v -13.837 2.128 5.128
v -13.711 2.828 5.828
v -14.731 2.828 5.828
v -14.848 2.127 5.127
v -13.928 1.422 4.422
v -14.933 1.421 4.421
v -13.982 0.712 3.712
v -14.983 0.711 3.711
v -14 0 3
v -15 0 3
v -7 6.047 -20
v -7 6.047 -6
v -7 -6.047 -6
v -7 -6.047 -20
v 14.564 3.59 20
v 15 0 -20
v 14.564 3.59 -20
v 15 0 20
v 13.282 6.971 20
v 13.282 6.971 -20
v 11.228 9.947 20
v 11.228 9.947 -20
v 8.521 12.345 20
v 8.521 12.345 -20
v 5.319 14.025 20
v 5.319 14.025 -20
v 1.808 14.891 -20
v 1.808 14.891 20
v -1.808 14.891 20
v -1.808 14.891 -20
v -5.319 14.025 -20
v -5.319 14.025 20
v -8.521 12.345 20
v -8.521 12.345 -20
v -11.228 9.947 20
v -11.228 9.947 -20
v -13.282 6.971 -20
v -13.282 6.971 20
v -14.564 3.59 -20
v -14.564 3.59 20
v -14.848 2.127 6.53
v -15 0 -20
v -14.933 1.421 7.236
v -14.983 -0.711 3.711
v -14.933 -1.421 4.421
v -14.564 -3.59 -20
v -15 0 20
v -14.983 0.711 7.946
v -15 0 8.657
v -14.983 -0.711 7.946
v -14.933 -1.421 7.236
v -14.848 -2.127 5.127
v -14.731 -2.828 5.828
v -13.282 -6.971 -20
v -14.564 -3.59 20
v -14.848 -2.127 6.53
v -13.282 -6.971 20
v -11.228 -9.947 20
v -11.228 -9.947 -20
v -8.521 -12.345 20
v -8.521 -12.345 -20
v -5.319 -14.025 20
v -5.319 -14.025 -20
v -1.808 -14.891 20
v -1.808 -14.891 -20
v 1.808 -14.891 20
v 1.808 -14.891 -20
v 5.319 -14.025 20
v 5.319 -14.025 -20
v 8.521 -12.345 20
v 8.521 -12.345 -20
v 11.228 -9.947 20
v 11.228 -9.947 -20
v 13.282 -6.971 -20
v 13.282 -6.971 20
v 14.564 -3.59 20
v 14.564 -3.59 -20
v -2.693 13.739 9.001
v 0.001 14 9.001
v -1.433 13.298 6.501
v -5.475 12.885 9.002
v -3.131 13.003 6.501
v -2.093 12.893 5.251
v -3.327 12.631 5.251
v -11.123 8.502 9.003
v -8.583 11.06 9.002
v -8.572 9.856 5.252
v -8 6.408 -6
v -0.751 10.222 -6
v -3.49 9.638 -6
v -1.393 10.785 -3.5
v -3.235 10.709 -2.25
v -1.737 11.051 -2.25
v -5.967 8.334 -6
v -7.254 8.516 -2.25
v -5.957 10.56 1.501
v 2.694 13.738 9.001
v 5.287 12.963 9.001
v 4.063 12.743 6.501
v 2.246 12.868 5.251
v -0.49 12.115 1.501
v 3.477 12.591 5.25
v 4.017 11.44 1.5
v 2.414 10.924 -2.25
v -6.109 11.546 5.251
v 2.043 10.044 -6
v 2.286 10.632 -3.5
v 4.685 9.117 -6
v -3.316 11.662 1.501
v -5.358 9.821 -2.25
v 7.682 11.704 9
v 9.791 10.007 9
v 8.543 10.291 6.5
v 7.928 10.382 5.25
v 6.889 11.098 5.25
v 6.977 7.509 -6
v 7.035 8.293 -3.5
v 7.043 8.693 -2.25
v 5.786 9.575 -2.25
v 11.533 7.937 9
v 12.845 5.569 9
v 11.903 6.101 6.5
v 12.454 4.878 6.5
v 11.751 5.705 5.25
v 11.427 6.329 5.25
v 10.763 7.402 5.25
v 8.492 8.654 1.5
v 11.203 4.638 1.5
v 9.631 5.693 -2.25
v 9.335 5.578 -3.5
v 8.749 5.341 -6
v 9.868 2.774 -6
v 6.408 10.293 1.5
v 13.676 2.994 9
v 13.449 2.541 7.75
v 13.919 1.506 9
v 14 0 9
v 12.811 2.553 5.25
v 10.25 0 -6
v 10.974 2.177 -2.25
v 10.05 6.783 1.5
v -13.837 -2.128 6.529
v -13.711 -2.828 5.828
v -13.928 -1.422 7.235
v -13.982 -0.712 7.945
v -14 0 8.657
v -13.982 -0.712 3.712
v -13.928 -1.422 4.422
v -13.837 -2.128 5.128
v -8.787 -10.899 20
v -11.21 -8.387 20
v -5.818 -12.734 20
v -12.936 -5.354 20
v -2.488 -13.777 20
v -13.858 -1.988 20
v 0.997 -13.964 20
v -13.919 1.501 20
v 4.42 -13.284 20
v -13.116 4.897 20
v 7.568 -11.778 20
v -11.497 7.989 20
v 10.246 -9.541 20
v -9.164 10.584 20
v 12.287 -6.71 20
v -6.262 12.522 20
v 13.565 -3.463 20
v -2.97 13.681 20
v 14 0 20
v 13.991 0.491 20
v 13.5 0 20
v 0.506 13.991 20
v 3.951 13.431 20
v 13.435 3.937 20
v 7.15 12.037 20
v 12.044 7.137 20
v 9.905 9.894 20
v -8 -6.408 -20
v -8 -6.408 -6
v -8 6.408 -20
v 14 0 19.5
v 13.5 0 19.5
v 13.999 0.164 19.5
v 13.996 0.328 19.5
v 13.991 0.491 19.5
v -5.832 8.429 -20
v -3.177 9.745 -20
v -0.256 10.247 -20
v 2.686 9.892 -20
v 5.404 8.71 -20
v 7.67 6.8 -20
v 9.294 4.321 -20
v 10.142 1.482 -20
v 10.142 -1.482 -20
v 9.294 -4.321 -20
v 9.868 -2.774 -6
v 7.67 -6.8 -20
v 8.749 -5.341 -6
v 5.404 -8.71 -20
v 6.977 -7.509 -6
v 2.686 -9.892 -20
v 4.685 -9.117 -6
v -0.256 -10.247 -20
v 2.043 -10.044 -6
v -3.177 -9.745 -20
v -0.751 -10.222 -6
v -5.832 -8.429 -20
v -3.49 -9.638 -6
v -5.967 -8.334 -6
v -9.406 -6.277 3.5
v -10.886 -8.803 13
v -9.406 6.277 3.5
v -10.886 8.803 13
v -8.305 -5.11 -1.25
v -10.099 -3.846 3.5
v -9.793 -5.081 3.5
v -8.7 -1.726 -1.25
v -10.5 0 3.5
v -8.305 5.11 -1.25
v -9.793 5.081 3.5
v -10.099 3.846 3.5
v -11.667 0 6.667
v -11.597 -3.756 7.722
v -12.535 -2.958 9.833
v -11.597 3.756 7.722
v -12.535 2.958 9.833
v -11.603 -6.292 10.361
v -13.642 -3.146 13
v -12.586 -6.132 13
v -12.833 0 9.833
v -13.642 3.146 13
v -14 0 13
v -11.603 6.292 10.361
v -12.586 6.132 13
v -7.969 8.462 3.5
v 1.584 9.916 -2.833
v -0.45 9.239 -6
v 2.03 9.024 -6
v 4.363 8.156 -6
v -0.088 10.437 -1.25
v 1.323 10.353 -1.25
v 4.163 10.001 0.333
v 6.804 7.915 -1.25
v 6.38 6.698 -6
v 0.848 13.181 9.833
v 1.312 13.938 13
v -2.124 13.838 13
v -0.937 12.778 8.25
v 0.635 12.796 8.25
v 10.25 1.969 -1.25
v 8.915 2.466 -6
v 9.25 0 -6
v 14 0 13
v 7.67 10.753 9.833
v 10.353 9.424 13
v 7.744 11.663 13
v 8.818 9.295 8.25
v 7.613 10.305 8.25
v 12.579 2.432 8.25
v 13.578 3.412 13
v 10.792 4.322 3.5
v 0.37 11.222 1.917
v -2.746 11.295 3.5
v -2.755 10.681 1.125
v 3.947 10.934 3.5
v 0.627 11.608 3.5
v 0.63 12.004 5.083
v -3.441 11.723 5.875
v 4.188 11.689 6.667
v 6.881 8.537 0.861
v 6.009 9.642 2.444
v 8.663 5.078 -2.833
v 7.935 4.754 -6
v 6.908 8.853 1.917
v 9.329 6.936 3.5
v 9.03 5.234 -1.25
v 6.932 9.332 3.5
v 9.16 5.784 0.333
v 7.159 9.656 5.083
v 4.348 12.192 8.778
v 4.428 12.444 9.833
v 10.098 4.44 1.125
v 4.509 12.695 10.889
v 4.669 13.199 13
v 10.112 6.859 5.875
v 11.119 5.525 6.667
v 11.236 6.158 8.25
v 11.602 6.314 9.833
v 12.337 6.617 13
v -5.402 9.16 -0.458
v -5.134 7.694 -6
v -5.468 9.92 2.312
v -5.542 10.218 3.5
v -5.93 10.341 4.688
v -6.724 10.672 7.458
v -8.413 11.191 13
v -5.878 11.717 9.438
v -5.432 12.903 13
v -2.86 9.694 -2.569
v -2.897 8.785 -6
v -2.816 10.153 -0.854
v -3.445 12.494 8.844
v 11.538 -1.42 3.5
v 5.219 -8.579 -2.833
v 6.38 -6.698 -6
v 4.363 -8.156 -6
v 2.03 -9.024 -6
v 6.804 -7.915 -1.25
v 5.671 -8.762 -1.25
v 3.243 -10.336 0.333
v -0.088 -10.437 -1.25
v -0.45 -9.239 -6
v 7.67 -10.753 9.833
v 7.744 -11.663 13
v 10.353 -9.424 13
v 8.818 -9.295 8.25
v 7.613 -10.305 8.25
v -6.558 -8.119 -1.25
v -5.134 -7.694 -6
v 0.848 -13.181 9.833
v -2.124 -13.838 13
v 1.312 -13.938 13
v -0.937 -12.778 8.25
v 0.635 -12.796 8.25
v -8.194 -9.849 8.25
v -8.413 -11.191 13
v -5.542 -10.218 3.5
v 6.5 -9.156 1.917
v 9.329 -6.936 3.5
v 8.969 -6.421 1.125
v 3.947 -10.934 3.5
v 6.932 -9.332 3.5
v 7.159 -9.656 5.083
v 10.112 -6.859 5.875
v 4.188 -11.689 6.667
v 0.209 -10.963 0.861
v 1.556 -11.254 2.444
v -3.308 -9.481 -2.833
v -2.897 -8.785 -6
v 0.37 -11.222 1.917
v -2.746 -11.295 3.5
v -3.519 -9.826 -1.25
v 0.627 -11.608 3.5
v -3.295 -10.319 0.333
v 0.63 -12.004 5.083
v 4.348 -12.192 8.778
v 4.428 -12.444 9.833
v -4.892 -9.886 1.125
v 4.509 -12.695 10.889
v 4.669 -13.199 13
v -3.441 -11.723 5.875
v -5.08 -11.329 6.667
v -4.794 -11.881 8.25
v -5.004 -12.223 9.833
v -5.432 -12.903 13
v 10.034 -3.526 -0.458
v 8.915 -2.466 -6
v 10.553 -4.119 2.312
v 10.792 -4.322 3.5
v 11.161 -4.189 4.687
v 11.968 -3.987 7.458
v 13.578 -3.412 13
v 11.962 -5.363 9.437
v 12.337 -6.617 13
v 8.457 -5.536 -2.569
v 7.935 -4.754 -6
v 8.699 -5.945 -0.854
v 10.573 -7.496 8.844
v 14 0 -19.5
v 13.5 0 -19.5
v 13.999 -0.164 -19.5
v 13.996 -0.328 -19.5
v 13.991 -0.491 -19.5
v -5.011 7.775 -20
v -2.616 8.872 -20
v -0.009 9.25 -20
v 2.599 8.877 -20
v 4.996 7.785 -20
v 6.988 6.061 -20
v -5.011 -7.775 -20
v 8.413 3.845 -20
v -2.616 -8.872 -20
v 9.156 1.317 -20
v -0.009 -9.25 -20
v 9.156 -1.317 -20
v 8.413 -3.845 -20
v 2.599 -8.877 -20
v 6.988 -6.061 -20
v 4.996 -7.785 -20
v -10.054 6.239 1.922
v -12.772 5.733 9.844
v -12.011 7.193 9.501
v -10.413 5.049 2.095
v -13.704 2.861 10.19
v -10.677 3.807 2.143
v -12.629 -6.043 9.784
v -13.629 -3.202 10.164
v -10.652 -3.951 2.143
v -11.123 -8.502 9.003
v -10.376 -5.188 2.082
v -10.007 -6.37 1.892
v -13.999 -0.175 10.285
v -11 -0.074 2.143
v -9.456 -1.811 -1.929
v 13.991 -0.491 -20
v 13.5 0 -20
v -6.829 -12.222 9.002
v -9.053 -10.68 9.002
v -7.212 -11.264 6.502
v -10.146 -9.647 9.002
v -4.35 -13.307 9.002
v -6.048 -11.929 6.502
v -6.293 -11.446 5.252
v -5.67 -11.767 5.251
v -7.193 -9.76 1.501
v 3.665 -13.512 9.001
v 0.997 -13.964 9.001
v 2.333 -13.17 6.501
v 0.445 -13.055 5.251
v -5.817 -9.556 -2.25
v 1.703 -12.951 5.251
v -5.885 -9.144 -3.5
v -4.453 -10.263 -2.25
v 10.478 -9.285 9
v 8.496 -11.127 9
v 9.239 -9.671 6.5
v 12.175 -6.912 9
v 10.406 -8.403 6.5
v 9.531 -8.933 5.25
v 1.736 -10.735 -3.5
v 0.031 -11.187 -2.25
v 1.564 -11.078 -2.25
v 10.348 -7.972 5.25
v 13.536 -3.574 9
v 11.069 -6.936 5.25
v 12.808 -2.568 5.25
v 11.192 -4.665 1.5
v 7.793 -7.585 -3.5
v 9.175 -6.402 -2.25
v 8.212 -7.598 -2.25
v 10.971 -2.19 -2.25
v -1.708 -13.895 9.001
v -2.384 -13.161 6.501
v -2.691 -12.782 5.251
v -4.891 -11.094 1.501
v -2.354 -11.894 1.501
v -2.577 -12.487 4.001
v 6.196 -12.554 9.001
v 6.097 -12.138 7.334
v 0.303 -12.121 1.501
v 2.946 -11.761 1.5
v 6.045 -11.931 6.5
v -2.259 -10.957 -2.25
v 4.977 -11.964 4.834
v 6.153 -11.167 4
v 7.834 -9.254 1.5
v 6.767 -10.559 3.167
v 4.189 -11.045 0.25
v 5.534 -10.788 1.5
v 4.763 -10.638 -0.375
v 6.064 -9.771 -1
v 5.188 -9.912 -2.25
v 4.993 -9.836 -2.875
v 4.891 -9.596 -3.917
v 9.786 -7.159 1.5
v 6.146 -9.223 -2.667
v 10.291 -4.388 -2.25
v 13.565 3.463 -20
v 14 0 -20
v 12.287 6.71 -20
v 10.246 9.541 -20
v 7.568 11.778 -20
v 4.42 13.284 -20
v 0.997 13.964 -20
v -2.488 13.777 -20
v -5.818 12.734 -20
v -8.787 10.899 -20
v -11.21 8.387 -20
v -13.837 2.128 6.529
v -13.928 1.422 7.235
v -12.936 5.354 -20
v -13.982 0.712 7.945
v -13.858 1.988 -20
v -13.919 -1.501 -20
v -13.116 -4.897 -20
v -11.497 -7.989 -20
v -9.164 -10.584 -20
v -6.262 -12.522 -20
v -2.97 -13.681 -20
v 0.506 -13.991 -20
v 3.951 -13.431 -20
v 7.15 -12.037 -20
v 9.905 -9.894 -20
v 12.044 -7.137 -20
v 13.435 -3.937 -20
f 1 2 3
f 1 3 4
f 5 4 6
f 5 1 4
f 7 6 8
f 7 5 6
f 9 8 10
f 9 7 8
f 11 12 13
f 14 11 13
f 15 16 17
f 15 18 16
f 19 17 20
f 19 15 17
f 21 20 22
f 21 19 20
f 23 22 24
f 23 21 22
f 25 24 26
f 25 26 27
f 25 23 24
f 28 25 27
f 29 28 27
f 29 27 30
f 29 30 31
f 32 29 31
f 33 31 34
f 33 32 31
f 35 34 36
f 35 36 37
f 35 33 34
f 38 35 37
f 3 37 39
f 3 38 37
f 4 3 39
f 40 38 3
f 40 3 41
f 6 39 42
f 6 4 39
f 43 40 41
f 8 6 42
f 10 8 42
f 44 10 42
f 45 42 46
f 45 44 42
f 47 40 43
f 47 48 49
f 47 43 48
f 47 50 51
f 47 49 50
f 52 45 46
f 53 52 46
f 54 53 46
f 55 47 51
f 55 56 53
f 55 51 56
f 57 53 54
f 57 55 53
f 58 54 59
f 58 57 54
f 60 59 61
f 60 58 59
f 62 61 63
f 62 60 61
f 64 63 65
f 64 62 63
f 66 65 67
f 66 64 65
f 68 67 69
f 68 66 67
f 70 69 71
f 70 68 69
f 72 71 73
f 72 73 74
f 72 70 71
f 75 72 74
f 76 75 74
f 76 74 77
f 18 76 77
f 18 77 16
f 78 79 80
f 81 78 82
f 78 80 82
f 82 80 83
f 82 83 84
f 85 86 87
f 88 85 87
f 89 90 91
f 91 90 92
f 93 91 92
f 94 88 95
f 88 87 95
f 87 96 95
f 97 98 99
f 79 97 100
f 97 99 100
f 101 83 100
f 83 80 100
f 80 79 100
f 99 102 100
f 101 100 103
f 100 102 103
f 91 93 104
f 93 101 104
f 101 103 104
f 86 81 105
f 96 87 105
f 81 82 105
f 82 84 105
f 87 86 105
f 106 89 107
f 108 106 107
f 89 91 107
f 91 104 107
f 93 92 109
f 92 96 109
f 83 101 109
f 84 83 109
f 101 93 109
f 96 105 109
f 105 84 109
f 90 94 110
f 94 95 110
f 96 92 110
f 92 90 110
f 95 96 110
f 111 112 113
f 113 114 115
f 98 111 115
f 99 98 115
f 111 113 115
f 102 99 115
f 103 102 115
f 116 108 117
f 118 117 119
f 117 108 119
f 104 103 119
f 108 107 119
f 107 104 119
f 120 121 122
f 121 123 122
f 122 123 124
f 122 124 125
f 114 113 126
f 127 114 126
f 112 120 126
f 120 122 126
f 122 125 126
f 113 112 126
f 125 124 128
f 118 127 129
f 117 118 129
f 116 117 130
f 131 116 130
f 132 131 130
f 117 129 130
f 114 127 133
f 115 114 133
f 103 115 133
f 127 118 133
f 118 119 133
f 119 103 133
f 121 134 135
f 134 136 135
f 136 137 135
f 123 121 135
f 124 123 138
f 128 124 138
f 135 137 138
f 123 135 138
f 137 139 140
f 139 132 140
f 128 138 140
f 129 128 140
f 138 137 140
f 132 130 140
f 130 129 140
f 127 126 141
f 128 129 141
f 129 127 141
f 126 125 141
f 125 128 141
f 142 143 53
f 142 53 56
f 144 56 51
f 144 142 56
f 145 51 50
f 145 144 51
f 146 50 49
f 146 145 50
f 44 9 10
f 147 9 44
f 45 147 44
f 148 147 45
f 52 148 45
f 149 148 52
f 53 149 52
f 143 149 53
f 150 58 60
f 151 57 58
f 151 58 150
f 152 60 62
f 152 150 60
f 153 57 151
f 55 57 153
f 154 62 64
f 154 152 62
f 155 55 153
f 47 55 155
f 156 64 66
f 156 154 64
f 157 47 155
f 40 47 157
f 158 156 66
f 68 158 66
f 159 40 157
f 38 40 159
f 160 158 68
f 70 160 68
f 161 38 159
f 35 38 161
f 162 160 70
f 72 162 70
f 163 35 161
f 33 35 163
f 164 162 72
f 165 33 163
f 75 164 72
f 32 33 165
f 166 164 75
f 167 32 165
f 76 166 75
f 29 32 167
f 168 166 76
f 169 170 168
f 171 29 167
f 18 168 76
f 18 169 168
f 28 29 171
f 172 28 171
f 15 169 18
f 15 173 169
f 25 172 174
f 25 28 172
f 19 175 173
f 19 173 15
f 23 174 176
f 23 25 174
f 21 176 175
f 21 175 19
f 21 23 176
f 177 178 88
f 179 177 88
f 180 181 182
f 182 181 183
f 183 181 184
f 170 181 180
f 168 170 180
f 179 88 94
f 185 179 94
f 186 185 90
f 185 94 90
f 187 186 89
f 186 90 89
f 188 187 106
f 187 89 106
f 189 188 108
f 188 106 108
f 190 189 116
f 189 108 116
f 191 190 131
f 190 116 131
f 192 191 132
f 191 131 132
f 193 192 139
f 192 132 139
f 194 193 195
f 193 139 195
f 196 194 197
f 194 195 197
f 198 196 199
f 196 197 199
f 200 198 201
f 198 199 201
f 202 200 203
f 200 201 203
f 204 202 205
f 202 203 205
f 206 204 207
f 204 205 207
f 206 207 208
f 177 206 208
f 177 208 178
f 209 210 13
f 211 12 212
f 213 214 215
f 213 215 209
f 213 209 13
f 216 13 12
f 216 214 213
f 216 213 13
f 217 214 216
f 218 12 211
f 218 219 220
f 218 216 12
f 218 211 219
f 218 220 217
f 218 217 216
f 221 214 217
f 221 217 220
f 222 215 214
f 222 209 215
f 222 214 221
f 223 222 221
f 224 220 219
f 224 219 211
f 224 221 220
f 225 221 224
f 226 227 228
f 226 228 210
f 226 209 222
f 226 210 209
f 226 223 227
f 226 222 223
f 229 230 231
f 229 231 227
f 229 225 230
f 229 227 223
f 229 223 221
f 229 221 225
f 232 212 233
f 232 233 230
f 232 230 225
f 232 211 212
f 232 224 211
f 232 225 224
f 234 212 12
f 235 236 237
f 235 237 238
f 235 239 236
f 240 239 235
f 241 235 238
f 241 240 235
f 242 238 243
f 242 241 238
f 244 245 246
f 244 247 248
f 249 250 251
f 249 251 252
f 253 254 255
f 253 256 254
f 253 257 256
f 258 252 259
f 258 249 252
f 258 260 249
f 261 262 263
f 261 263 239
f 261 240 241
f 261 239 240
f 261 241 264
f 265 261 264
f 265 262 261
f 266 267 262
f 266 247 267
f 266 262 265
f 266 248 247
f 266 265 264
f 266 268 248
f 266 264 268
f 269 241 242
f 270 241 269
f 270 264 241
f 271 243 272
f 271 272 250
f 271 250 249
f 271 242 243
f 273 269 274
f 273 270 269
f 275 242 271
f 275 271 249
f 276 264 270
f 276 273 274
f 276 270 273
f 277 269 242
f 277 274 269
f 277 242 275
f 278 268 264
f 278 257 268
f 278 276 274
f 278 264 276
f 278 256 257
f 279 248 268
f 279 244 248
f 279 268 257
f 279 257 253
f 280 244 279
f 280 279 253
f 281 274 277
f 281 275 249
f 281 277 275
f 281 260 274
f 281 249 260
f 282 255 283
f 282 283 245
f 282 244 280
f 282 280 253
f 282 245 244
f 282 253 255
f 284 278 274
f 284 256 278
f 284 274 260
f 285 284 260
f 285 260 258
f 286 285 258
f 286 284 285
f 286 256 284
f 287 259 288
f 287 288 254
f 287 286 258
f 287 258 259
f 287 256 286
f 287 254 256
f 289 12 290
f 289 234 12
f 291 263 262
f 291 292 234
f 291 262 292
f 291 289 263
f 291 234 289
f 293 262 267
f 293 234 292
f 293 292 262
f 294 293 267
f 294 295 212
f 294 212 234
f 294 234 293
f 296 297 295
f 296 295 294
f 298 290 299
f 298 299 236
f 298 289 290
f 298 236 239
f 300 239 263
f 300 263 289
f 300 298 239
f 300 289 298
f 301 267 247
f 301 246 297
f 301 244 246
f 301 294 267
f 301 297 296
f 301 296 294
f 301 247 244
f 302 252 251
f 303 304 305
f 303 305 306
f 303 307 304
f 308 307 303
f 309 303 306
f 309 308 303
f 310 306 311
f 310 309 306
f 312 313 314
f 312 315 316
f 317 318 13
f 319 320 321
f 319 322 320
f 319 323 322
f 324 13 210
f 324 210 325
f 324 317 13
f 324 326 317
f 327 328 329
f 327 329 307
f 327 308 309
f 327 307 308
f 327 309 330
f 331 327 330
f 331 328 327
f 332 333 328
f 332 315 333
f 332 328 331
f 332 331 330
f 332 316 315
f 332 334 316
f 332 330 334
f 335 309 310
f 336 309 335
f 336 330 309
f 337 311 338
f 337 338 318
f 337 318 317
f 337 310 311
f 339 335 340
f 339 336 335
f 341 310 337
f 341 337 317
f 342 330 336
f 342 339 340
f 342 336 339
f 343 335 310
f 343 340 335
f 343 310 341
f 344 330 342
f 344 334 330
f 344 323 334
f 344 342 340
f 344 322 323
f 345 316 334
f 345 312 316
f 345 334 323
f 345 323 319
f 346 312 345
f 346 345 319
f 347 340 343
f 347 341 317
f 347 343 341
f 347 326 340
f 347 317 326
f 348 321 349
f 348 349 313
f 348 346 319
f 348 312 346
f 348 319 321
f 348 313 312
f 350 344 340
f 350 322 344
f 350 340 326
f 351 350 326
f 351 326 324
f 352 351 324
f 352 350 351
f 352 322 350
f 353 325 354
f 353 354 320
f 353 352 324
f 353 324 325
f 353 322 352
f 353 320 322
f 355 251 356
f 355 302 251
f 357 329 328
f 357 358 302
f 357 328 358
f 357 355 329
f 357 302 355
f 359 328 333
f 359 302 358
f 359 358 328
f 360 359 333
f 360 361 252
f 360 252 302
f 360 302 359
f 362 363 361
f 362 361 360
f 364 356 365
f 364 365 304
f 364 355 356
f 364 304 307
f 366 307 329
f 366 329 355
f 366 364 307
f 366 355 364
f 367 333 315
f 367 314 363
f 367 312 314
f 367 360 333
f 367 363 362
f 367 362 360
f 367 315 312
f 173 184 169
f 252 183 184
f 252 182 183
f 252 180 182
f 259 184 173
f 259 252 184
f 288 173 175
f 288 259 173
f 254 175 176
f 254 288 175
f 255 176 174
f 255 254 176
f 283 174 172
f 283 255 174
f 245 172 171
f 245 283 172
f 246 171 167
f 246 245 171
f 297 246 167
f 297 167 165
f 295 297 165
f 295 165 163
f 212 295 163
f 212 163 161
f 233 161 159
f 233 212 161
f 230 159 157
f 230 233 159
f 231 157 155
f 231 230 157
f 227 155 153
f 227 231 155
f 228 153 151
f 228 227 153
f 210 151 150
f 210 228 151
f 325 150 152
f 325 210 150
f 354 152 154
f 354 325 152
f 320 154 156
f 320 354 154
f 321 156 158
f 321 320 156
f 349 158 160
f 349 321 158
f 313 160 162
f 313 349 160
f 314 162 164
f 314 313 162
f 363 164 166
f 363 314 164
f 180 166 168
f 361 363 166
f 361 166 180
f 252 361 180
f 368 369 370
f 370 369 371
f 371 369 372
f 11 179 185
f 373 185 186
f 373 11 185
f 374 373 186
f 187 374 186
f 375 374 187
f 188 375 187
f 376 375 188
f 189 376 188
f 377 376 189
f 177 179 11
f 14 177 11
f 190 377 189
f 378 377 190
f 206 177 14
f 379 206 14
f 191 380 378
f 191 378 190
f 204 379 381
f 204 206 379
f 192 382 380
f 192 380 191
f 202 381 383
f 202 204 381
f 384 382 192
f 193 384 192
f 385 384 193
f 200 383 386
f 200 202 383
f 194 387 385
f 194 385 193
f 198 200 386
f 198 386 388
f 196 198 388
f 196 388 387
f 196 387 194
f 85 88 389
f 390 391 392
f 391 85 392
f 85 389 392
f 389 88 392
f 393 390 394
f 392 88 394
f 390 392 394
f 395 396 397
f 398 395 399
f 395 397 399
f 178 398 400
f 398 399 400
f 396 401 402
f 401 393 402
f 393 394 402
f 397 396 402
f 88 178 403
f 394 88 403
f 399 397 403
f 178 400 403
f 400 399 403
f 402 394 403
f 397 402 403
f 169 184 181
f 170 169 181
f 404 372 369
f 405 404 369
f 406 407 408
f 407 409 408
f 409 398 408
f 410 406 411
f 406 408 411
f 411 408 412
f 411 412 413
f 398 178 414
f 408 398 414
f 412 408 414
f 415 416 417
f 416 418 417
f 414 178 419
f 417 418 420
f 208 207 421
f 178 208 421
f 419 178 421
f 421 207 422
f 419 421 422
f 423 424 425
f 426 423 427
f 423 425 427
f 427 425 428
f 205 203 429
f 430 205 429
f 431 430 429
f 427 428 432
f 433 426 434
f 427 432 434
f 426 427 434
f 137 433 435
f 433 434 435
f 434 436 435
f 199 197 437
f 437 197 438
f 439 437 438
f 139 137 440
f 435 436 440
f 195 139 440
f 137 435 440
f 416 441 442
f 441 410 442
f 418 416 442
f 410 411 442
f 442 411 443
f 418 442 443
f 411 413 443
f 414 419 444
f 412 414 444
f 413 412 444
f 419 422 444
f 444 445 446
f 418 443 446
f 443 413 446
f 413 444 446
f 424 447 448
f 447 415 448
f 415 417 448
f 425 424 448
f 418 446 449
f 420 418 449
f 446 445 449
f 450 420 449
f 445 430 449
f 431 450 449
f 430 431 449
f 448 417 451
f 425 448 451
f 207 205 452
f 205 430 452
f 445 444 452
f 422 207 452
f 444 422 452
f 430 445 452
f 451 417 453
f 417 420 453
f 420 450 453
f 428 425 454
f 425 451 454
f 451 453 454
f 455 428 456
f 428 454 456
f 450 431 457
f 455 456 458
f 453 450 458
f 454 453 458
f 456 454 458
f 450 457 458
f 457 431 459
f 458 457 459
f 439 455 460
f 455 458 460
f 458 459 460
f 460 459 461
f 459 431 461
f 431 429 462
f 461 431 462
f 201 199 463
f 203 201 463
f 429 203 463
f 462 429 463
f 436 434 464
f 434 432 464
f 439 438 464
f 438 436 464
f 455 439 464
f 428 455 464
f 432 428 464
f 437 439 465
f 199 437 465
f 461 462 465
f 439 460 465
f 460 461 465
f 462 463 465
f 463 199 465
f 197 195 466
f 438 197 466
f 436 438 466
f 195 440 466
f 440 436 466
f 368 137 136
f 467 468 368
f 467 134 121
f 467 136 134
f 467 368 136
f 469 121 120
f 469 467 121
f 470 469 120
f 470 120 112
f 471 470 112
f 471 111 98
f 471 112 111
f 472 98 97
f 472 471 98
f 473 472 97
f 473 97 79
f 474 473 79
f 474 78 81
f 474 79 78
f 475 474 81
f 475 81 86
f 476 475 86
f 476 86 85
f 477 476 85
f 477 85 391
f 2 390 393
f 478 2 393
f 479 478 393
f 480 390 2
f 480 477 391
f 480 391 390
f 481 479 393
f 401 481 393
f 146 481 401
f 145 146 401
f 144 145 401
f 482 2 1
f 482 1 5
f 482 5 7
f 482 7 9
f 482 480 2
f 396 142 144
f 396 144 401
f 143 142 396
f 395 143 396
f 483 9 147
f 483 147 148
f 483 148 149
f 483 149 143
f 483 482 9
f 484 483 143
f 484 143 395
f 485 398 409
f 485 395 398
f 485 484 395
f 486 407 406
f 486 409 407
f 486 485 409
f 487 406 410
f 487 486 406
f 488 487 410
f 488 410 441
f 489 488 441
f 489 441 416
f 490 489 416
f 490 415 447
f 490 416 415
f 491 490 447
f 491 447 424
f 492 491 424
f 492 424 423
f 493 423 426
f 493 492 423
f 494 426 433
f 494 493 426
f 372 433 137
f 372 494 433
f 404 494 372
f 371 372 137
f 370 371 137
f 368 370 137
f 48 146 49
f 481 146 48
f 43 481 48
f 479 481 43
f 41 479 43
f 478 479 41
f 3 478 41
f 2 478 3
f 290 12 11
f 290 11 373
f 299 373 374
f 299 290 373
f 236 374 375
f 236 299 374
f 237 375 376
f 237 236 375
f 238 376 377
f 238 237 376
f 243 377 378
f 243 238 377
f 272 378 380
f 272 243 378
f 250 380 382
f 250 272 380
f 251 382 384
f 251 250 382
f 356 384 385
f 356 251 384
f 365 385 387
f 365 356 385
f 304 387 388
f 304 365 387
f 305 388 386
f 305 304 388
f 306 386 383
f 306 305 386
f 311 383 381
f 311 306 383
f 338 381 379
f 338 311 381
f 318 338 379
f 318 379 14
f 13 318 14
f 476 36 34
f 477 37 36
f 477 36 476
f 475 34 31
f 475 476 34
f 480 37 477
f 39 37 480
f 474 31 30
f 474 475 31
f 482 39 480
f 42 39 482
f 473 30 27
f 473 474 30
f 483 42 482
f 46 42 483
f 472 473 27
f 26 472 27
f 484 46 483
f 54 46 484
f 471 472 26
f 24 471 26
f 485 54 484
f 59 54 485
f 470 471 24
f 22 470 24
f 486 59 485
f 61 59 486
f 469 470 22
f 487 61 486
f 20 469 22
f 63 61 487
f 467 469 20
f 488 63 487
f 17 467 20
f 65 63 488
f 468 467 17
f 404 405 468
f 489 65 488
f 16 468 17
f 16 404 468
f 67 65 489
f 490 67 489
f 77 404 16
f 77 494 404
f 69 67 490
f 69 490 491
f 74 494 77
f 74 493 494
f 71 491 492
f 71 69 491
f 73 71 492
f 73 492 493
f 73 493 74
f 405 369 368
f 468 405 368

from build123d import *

# Parameters (mm, degrees)
EXTRUDE_DEPTH  = 14
SKETCH_R       = 15
SKETCH_R_2     = 14
PAD_DEPTH      = 20
PAD_DEPTH_BACK = 20
PAD001_DEPTH   = 0.5
PAD002_DEPTH   = 0.5
POCKET_DEPTH   = 7.001
SKETCH012_R    = 14
SKETCH005_R    = 15


with BuildPart() as extrude_body:
    # Sketch009 (on Face1 of CopyCut001) → Extrude (new body)
    with BuildSketch(Plane(origin=(0, 0, -6), x_dir=(1, 0, 0), z_dir=(0, 0, -1))):
        with BuildLine():
            ThreePointArc((-8, -6.408003), (10.25, 0), (-8, 6.408003))
            Line((-8, 6.408003), (-8, -6.408003))
        make_face()
        with BuildLine():
            ThreePointArc((-7, -6.046693), (9.25, 0), (-7, 6.046693))
            Line((-7, -6.046693), (-7, 6.046693))
        make_face(mode=Mode.SUBTRACT)
    extrude(amount=EXTRUDE_DEPTH)


with BuildPart() as body:
    # Sketch → Pad (new body, two sides)
    with BuildSketch(Plane.XY) as pad_sk:
        Circle(SKETCH_R)
        Circle(SKETCH_R_2, mode=Mode.SUBTRACT)
    extrude(amount=PAD_DEPTH)
    extrude(pad_sk.sketch, amount=-PAD_DEPTH_BACK)

    # Sketch002 (on DatumPlane) → Pad001 (join)
    with BuildSketch(Plane.XY.offset(19.5)):
        Polygon((13.5, 0), (14, 0), (14, 0.5), align=None)
    extrude(amount=PAD001_DEPTH)

    # Sketch003 (on DatumPlane) → Pad002 (join)
    with BuildSketch(Plane(origin=(0, 0, -19.5), x_dir=(1, 0, 0), z_dir=(0, 0, -1))):
        Polygon((13.5, 0), (14, 0), (14, 0.5), align=None)
    extrude(amount=PAD002_DEPTH)

    # Sketch010 (on Face1 of CopyExtrude001) → Pocket (cut, through all)
    with BuildSketch(Plane(origin=(-8, 0, 0), x_dir=(0, -1, 0), z_dir=(-1, 0, 0))):
        Polygon((0, 3), (2.828427, 5.828427), (0, 8.656854), (-2.828427, 5.828427), align=None)
    extrude(amount=POCKET_DEPTH, mode=Mode.SUBTRACT)


with BuildPart() as loft001:
    # Sketch007 (on Face1 of CopyLoft001) → Loft001 section 0
    with BuildSketch(Plane(origin=(0, 0, -6), x_dir=(1, 0, 0), z_dir=(0, 0, -1))):
        with BuildLine():
            ThreePointArc((-7, -6.046693), (9.25, 0), (-7, 6.046693))
            Line((-7, 6.046693), (-7, -6.046693))
        make_face()
    # Sketch012 (on Face1 of CopyLoft002) → Loft001 section 1
    with BuildSketch(Plane.XY.offset(13)):
        Circle(SKETCH012_R)
    loft()


with BuildPart() as fusion:
    # Sketch005 (on DatumPlane) → Loft section 0
    with BuildSketch(Plane.XY.offset(13)):
        Circle(SKETCH005_R)
    # Sketch004 (on DatumPlane) → Loft section 1
    with BuildSketch(Plane(origin=(0, 0, -6), x_dir=(1, 0, 0), z_dir=(0, 0, -1))):
        with BuildLine():
            ThreePointArc((-8, -6.408003), (10.25, 0), (-8, 6.408003))
            Line((-8, 6.408003), (-8, -6.408003))
        make_face()
    loft()

    # Cut: cut Loft001
    add(loft001.part, mode=Mode.SUBTRACT)

    # Fusion: union Extrude body, Body
    add(extrude_body.part)
    add(body.part)


solid = fusion.part
